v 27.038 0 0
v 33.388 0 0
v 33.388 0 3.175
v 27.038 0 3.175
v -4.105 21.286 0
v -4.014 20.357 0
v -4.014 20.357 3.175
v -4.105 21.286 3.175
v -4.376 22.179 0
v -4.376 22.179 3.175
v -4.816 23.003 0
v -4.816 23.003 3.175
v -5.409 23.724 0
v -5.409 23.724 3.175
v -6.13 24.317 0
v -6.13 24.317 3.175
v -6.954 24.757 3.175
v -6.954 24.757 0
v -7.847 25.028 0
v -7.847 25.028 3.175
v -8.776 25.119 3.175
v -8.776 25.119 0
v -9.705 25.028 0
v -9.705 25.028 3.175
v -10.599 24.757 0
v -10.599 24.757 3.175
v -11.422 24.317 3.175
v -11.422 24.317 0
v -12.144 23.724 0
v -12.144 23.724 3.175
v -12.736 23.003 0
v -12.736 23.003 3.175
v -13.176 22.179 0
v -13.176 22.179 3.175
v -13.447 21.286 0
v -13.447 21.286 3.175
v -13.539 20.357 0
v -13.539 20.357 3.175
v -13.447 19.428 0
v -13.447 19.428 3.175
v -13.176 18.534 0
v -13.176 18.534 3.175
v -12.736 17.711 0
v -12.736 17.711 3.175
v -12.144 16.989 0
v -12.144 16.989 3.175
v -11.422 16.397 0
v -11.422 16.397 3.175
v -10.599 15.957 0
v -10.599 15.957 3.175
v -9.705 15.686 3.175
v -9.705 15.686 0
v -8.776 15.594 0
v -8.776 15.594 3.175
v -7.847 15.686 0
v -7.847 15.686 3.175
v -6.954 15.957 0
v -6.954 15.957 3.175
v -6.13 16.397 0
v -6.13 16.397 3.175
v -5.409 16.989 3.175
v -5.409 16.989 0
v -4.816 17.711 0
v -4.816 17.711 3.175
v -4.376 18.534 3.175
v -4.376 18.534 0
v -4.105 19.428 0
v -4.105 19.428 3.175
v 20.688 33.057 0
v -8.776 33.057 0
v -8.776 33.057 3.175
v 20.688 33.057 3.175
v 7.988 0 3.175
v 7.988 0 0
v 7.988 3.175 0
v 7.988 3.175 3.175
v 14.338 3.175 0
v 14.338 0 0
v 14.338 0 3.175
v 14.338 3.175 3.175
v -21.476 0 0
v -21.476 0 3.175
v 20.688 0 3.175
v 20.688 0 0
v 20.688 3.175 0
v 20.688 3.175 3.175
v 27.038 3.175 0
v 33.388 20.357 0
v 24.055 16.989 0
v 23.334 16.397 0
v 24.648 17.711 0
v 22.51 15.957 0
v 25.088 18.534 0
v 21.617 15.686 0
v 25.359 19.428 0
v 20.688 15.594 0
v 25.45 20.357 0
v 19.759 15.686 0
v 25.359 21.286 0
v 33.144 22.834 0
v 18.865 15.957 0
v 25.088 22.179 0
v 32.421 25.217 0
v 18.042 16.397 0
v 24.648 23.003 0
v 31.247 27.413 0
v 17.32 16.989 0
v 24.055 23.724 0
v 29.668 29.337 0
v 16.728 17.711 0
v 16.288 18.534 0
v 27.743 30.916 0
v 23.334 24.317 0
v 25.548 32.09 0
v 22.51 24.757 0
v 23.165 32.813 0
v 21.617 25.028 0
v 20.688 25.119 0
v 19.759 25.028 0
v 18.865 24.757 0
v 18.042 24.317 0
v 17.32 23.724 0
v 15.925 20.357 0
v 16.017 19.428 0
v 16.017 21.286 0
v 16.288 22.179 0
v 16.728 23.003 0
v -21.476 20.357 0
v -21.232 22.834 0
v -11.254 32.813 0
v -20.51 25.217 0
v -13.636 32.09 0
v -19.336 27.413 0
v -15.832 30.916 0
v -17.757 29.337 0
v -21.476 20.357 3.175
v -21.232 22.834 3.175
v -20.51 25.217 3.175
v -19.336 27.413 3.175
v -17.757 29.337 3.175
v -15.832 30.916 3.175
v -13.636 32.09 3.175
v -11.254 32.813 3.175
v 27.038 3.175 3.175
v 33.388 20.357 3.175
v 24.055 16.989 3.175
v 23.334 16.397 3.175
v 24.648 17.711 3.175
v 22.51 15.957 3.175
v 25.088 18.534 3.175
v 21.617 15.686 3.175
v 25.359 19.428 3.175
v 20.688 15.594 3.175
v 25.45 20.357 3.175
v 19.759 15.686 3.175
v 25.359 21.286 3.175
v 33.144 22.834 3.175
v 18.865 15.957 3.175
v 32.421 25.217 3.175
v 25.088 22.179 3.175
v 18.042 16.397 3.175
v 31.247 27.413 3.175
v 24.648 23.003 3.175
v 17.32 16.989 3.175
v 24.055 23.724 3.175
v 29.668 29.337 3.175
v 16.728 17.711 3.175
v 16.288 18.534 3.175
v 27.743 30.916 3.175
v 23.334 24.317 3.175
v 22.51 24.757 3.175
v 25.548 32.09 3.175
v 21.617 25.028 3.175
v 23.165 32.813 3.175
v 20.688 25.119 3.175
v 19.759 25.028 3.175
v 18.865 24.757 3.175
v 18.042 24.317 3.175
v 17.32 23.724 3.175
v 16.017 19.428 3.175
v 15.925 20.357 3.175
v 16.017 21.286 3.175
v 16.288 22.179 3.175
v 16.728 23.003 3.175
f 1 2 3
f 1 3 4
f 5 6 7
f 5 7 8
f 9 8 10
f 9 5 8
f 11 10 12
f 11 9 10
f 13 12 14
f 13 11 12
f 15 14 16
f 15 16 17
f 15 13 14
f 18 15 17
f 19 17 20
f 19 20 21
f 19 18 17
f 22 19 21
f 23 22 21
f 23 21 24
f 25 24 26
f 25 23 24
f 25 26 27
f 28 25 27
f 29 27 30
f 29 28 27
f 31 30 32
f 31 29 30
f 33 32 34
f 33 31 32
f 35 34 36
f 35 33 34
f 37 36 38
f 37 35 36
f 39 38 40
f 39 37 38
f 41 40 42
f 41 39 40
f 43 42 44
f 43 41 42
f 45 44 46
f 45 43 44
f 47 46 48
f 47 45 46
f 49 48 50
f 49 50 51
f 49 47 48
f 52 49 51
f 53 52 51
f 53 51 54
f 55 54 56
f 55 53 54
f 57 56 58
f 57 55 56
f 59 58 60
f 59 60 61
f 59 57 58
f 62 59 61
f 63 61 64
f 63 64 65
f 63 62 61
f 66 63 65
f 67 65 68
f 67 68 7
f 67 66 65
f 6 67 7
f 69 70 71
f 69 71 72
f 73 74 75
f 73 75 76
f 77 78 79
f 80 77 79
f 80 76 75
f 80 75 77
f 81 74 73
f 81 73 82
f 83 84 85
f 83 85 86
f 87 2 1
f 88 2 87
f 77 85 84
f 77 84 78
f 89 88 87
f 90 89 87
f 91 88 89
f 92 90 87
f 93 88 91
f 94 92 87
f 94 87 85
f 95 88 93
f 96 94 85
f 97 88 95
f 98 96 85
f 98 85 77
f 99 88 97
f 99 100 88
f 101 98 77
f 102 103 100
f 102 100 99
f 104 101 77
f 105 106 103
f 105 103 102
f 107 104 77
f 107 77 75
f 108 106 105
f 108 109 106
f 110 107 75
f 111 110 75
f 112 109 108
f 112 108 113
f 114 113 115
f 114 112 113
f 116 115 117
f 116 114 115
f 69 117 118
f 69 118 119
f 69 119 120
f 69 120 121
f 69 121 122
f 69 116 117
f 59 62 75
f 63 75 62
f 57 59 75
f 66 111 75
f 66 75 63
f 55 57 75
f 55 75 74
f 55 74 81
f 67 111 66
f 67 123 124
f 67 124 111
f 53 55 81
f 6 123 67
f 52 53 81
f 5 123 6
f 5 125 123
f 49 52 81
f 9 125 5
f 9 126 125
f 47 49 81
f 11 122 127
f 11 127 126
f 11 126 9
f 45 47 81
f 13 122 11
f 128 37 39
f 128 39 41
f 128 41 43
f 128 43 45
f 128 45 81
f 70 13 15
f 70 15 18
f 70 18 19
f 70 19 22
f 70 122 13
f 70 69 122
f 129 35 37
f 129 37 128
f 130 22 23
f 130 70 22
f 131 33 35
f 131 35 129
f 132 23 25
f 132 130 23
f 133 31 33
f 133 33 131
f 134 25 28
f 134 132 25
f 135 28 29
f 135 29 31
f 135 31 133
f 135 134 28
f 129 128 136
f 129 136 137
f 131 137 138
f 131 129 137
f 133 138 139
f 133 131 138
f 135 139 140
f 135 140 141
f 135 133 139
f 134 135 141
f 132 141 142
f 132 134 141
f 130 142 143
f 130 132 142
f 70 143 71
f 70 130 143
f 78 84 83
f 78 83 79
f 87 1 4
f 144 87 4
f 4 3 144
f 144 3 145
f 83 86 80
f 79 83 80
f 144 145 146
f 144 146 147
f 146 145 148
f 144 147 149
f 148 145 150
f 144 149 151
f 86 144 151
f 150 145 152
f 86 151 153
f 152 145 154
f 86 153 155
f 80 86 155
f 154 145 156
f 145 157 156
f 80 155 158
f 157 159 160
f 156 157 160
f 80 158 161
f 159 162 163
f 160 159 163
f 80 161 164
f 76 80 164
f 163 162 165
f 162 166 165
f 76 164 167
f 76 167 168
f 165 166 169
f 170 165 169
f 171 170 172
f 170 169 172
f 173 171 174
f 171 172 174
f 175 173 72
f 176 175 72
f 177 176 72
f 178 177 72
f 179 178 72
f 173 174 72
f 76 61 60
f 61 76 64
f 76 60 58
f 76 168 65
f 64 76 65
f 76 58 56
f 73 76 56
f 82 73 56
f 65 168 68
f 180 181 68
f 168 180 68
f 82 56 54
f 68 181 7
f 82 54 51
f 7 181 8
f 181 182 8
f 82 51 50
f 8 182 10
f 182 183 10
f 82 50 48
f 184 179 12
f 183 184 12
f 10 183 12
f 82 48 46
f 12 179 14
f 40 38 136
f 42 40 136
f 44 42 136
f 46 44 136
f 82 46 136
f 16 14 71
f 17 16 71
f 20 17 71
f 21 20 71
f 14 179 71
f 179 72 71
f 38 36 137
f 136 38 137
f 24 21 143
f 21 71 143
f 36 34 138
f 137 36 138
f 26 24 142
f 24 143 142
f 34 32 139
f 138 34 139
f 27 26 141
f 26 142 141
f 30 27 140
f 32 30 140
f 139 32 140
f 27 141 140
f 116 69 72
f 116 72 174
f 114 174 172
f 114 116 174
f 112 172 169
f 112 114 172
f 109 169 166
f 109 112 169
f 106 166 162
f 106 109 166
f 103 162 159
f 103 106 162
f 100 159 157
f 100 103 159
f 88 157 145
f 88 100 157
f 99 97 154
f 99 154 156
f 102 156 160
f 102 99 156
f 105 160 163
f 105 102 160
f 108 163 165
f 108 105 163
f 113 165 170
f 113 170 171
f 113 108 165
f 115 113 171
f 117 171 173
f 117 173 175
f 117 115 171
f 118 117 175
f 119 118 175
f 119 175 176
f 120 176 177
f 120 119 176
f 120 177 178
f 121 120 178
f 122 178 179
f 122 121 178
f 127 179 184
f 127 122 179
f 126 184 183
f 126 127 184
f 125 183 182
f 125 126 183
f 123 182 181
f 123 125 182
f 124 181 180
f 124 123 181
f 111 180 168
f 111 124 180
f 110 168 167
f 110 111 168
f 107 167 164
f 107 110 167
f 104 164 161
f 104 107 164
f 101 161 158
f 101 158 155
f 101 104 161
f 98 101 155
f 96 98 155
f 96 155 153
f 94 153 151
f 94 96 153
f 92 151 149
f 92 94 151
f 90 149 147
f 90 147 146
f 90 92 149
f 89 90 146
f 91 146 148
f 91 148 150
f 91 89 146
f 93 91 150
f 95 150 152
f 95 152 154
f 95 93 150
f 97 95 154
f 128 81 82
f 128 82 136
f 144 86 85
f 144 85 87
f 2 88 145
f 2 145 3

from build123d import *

# Parameters (mm, degrees)
SKETCH1_R           = 4.7625
BOSS_EXTRUDE1_DEPTH = 3.175
SKETCH2_W           = 6.35
SKETCH2_H           = 3.175
CUT_EXTRUDE1_DEPTH  = 3.175


with BuildPart() as part:
    # Sketch1 → Boss-Extrude1 (new body)
    with BuildSketch(Plane.XY):
        with BuildLine():
            Line((33.387675642, 20.35683), (33.387675642, 0))
            Line((33.387675642, 0), (-21.476324358, 0))
            Line((-21.476324358, 0), (-21.476324358, 20.35683))
            ThreePointArc((-21.476324358, 20.35683), (-17.756580479, 29.337086121), (-8.776324358, 33.05683))
            Line((-8.776324358, 33.05683), (20.687675642, 33.05683))
            ThreePointArc((20.687675642, 33.05683), (29.667931764, 29.337086121), (33.387675642, 20.35683))
        make_face()
        with Locations((20.687675642, 20.35683)):
            Circle(SKETCH1_R, mode=Mode.SUBTRACT)
        with Locations((-8.776324358, 20.35683)):
            Circle(SKETCH1_R, mode=Mode.SUBTRACT)
    extrude(amount=BOSS_EXTRUDE1_DEPTH)

    # Sketch2 → Cut-Extrude1 (cut)
    with BuildSketch(Plane.XZ):
        with Locations((23.862675642, 1.5875)):
            Rectangle(SKETCH2_W, SKETCH2_H)
        with Locations((11.162675642, 1.5875)):
            Rectangle(SKETCH2_W, SKETCH2_H)
    extrude(amount=-CUT_EXTRUDE1_DEPTH, mode=Mode.SUBTRACT)


solid = part.part
